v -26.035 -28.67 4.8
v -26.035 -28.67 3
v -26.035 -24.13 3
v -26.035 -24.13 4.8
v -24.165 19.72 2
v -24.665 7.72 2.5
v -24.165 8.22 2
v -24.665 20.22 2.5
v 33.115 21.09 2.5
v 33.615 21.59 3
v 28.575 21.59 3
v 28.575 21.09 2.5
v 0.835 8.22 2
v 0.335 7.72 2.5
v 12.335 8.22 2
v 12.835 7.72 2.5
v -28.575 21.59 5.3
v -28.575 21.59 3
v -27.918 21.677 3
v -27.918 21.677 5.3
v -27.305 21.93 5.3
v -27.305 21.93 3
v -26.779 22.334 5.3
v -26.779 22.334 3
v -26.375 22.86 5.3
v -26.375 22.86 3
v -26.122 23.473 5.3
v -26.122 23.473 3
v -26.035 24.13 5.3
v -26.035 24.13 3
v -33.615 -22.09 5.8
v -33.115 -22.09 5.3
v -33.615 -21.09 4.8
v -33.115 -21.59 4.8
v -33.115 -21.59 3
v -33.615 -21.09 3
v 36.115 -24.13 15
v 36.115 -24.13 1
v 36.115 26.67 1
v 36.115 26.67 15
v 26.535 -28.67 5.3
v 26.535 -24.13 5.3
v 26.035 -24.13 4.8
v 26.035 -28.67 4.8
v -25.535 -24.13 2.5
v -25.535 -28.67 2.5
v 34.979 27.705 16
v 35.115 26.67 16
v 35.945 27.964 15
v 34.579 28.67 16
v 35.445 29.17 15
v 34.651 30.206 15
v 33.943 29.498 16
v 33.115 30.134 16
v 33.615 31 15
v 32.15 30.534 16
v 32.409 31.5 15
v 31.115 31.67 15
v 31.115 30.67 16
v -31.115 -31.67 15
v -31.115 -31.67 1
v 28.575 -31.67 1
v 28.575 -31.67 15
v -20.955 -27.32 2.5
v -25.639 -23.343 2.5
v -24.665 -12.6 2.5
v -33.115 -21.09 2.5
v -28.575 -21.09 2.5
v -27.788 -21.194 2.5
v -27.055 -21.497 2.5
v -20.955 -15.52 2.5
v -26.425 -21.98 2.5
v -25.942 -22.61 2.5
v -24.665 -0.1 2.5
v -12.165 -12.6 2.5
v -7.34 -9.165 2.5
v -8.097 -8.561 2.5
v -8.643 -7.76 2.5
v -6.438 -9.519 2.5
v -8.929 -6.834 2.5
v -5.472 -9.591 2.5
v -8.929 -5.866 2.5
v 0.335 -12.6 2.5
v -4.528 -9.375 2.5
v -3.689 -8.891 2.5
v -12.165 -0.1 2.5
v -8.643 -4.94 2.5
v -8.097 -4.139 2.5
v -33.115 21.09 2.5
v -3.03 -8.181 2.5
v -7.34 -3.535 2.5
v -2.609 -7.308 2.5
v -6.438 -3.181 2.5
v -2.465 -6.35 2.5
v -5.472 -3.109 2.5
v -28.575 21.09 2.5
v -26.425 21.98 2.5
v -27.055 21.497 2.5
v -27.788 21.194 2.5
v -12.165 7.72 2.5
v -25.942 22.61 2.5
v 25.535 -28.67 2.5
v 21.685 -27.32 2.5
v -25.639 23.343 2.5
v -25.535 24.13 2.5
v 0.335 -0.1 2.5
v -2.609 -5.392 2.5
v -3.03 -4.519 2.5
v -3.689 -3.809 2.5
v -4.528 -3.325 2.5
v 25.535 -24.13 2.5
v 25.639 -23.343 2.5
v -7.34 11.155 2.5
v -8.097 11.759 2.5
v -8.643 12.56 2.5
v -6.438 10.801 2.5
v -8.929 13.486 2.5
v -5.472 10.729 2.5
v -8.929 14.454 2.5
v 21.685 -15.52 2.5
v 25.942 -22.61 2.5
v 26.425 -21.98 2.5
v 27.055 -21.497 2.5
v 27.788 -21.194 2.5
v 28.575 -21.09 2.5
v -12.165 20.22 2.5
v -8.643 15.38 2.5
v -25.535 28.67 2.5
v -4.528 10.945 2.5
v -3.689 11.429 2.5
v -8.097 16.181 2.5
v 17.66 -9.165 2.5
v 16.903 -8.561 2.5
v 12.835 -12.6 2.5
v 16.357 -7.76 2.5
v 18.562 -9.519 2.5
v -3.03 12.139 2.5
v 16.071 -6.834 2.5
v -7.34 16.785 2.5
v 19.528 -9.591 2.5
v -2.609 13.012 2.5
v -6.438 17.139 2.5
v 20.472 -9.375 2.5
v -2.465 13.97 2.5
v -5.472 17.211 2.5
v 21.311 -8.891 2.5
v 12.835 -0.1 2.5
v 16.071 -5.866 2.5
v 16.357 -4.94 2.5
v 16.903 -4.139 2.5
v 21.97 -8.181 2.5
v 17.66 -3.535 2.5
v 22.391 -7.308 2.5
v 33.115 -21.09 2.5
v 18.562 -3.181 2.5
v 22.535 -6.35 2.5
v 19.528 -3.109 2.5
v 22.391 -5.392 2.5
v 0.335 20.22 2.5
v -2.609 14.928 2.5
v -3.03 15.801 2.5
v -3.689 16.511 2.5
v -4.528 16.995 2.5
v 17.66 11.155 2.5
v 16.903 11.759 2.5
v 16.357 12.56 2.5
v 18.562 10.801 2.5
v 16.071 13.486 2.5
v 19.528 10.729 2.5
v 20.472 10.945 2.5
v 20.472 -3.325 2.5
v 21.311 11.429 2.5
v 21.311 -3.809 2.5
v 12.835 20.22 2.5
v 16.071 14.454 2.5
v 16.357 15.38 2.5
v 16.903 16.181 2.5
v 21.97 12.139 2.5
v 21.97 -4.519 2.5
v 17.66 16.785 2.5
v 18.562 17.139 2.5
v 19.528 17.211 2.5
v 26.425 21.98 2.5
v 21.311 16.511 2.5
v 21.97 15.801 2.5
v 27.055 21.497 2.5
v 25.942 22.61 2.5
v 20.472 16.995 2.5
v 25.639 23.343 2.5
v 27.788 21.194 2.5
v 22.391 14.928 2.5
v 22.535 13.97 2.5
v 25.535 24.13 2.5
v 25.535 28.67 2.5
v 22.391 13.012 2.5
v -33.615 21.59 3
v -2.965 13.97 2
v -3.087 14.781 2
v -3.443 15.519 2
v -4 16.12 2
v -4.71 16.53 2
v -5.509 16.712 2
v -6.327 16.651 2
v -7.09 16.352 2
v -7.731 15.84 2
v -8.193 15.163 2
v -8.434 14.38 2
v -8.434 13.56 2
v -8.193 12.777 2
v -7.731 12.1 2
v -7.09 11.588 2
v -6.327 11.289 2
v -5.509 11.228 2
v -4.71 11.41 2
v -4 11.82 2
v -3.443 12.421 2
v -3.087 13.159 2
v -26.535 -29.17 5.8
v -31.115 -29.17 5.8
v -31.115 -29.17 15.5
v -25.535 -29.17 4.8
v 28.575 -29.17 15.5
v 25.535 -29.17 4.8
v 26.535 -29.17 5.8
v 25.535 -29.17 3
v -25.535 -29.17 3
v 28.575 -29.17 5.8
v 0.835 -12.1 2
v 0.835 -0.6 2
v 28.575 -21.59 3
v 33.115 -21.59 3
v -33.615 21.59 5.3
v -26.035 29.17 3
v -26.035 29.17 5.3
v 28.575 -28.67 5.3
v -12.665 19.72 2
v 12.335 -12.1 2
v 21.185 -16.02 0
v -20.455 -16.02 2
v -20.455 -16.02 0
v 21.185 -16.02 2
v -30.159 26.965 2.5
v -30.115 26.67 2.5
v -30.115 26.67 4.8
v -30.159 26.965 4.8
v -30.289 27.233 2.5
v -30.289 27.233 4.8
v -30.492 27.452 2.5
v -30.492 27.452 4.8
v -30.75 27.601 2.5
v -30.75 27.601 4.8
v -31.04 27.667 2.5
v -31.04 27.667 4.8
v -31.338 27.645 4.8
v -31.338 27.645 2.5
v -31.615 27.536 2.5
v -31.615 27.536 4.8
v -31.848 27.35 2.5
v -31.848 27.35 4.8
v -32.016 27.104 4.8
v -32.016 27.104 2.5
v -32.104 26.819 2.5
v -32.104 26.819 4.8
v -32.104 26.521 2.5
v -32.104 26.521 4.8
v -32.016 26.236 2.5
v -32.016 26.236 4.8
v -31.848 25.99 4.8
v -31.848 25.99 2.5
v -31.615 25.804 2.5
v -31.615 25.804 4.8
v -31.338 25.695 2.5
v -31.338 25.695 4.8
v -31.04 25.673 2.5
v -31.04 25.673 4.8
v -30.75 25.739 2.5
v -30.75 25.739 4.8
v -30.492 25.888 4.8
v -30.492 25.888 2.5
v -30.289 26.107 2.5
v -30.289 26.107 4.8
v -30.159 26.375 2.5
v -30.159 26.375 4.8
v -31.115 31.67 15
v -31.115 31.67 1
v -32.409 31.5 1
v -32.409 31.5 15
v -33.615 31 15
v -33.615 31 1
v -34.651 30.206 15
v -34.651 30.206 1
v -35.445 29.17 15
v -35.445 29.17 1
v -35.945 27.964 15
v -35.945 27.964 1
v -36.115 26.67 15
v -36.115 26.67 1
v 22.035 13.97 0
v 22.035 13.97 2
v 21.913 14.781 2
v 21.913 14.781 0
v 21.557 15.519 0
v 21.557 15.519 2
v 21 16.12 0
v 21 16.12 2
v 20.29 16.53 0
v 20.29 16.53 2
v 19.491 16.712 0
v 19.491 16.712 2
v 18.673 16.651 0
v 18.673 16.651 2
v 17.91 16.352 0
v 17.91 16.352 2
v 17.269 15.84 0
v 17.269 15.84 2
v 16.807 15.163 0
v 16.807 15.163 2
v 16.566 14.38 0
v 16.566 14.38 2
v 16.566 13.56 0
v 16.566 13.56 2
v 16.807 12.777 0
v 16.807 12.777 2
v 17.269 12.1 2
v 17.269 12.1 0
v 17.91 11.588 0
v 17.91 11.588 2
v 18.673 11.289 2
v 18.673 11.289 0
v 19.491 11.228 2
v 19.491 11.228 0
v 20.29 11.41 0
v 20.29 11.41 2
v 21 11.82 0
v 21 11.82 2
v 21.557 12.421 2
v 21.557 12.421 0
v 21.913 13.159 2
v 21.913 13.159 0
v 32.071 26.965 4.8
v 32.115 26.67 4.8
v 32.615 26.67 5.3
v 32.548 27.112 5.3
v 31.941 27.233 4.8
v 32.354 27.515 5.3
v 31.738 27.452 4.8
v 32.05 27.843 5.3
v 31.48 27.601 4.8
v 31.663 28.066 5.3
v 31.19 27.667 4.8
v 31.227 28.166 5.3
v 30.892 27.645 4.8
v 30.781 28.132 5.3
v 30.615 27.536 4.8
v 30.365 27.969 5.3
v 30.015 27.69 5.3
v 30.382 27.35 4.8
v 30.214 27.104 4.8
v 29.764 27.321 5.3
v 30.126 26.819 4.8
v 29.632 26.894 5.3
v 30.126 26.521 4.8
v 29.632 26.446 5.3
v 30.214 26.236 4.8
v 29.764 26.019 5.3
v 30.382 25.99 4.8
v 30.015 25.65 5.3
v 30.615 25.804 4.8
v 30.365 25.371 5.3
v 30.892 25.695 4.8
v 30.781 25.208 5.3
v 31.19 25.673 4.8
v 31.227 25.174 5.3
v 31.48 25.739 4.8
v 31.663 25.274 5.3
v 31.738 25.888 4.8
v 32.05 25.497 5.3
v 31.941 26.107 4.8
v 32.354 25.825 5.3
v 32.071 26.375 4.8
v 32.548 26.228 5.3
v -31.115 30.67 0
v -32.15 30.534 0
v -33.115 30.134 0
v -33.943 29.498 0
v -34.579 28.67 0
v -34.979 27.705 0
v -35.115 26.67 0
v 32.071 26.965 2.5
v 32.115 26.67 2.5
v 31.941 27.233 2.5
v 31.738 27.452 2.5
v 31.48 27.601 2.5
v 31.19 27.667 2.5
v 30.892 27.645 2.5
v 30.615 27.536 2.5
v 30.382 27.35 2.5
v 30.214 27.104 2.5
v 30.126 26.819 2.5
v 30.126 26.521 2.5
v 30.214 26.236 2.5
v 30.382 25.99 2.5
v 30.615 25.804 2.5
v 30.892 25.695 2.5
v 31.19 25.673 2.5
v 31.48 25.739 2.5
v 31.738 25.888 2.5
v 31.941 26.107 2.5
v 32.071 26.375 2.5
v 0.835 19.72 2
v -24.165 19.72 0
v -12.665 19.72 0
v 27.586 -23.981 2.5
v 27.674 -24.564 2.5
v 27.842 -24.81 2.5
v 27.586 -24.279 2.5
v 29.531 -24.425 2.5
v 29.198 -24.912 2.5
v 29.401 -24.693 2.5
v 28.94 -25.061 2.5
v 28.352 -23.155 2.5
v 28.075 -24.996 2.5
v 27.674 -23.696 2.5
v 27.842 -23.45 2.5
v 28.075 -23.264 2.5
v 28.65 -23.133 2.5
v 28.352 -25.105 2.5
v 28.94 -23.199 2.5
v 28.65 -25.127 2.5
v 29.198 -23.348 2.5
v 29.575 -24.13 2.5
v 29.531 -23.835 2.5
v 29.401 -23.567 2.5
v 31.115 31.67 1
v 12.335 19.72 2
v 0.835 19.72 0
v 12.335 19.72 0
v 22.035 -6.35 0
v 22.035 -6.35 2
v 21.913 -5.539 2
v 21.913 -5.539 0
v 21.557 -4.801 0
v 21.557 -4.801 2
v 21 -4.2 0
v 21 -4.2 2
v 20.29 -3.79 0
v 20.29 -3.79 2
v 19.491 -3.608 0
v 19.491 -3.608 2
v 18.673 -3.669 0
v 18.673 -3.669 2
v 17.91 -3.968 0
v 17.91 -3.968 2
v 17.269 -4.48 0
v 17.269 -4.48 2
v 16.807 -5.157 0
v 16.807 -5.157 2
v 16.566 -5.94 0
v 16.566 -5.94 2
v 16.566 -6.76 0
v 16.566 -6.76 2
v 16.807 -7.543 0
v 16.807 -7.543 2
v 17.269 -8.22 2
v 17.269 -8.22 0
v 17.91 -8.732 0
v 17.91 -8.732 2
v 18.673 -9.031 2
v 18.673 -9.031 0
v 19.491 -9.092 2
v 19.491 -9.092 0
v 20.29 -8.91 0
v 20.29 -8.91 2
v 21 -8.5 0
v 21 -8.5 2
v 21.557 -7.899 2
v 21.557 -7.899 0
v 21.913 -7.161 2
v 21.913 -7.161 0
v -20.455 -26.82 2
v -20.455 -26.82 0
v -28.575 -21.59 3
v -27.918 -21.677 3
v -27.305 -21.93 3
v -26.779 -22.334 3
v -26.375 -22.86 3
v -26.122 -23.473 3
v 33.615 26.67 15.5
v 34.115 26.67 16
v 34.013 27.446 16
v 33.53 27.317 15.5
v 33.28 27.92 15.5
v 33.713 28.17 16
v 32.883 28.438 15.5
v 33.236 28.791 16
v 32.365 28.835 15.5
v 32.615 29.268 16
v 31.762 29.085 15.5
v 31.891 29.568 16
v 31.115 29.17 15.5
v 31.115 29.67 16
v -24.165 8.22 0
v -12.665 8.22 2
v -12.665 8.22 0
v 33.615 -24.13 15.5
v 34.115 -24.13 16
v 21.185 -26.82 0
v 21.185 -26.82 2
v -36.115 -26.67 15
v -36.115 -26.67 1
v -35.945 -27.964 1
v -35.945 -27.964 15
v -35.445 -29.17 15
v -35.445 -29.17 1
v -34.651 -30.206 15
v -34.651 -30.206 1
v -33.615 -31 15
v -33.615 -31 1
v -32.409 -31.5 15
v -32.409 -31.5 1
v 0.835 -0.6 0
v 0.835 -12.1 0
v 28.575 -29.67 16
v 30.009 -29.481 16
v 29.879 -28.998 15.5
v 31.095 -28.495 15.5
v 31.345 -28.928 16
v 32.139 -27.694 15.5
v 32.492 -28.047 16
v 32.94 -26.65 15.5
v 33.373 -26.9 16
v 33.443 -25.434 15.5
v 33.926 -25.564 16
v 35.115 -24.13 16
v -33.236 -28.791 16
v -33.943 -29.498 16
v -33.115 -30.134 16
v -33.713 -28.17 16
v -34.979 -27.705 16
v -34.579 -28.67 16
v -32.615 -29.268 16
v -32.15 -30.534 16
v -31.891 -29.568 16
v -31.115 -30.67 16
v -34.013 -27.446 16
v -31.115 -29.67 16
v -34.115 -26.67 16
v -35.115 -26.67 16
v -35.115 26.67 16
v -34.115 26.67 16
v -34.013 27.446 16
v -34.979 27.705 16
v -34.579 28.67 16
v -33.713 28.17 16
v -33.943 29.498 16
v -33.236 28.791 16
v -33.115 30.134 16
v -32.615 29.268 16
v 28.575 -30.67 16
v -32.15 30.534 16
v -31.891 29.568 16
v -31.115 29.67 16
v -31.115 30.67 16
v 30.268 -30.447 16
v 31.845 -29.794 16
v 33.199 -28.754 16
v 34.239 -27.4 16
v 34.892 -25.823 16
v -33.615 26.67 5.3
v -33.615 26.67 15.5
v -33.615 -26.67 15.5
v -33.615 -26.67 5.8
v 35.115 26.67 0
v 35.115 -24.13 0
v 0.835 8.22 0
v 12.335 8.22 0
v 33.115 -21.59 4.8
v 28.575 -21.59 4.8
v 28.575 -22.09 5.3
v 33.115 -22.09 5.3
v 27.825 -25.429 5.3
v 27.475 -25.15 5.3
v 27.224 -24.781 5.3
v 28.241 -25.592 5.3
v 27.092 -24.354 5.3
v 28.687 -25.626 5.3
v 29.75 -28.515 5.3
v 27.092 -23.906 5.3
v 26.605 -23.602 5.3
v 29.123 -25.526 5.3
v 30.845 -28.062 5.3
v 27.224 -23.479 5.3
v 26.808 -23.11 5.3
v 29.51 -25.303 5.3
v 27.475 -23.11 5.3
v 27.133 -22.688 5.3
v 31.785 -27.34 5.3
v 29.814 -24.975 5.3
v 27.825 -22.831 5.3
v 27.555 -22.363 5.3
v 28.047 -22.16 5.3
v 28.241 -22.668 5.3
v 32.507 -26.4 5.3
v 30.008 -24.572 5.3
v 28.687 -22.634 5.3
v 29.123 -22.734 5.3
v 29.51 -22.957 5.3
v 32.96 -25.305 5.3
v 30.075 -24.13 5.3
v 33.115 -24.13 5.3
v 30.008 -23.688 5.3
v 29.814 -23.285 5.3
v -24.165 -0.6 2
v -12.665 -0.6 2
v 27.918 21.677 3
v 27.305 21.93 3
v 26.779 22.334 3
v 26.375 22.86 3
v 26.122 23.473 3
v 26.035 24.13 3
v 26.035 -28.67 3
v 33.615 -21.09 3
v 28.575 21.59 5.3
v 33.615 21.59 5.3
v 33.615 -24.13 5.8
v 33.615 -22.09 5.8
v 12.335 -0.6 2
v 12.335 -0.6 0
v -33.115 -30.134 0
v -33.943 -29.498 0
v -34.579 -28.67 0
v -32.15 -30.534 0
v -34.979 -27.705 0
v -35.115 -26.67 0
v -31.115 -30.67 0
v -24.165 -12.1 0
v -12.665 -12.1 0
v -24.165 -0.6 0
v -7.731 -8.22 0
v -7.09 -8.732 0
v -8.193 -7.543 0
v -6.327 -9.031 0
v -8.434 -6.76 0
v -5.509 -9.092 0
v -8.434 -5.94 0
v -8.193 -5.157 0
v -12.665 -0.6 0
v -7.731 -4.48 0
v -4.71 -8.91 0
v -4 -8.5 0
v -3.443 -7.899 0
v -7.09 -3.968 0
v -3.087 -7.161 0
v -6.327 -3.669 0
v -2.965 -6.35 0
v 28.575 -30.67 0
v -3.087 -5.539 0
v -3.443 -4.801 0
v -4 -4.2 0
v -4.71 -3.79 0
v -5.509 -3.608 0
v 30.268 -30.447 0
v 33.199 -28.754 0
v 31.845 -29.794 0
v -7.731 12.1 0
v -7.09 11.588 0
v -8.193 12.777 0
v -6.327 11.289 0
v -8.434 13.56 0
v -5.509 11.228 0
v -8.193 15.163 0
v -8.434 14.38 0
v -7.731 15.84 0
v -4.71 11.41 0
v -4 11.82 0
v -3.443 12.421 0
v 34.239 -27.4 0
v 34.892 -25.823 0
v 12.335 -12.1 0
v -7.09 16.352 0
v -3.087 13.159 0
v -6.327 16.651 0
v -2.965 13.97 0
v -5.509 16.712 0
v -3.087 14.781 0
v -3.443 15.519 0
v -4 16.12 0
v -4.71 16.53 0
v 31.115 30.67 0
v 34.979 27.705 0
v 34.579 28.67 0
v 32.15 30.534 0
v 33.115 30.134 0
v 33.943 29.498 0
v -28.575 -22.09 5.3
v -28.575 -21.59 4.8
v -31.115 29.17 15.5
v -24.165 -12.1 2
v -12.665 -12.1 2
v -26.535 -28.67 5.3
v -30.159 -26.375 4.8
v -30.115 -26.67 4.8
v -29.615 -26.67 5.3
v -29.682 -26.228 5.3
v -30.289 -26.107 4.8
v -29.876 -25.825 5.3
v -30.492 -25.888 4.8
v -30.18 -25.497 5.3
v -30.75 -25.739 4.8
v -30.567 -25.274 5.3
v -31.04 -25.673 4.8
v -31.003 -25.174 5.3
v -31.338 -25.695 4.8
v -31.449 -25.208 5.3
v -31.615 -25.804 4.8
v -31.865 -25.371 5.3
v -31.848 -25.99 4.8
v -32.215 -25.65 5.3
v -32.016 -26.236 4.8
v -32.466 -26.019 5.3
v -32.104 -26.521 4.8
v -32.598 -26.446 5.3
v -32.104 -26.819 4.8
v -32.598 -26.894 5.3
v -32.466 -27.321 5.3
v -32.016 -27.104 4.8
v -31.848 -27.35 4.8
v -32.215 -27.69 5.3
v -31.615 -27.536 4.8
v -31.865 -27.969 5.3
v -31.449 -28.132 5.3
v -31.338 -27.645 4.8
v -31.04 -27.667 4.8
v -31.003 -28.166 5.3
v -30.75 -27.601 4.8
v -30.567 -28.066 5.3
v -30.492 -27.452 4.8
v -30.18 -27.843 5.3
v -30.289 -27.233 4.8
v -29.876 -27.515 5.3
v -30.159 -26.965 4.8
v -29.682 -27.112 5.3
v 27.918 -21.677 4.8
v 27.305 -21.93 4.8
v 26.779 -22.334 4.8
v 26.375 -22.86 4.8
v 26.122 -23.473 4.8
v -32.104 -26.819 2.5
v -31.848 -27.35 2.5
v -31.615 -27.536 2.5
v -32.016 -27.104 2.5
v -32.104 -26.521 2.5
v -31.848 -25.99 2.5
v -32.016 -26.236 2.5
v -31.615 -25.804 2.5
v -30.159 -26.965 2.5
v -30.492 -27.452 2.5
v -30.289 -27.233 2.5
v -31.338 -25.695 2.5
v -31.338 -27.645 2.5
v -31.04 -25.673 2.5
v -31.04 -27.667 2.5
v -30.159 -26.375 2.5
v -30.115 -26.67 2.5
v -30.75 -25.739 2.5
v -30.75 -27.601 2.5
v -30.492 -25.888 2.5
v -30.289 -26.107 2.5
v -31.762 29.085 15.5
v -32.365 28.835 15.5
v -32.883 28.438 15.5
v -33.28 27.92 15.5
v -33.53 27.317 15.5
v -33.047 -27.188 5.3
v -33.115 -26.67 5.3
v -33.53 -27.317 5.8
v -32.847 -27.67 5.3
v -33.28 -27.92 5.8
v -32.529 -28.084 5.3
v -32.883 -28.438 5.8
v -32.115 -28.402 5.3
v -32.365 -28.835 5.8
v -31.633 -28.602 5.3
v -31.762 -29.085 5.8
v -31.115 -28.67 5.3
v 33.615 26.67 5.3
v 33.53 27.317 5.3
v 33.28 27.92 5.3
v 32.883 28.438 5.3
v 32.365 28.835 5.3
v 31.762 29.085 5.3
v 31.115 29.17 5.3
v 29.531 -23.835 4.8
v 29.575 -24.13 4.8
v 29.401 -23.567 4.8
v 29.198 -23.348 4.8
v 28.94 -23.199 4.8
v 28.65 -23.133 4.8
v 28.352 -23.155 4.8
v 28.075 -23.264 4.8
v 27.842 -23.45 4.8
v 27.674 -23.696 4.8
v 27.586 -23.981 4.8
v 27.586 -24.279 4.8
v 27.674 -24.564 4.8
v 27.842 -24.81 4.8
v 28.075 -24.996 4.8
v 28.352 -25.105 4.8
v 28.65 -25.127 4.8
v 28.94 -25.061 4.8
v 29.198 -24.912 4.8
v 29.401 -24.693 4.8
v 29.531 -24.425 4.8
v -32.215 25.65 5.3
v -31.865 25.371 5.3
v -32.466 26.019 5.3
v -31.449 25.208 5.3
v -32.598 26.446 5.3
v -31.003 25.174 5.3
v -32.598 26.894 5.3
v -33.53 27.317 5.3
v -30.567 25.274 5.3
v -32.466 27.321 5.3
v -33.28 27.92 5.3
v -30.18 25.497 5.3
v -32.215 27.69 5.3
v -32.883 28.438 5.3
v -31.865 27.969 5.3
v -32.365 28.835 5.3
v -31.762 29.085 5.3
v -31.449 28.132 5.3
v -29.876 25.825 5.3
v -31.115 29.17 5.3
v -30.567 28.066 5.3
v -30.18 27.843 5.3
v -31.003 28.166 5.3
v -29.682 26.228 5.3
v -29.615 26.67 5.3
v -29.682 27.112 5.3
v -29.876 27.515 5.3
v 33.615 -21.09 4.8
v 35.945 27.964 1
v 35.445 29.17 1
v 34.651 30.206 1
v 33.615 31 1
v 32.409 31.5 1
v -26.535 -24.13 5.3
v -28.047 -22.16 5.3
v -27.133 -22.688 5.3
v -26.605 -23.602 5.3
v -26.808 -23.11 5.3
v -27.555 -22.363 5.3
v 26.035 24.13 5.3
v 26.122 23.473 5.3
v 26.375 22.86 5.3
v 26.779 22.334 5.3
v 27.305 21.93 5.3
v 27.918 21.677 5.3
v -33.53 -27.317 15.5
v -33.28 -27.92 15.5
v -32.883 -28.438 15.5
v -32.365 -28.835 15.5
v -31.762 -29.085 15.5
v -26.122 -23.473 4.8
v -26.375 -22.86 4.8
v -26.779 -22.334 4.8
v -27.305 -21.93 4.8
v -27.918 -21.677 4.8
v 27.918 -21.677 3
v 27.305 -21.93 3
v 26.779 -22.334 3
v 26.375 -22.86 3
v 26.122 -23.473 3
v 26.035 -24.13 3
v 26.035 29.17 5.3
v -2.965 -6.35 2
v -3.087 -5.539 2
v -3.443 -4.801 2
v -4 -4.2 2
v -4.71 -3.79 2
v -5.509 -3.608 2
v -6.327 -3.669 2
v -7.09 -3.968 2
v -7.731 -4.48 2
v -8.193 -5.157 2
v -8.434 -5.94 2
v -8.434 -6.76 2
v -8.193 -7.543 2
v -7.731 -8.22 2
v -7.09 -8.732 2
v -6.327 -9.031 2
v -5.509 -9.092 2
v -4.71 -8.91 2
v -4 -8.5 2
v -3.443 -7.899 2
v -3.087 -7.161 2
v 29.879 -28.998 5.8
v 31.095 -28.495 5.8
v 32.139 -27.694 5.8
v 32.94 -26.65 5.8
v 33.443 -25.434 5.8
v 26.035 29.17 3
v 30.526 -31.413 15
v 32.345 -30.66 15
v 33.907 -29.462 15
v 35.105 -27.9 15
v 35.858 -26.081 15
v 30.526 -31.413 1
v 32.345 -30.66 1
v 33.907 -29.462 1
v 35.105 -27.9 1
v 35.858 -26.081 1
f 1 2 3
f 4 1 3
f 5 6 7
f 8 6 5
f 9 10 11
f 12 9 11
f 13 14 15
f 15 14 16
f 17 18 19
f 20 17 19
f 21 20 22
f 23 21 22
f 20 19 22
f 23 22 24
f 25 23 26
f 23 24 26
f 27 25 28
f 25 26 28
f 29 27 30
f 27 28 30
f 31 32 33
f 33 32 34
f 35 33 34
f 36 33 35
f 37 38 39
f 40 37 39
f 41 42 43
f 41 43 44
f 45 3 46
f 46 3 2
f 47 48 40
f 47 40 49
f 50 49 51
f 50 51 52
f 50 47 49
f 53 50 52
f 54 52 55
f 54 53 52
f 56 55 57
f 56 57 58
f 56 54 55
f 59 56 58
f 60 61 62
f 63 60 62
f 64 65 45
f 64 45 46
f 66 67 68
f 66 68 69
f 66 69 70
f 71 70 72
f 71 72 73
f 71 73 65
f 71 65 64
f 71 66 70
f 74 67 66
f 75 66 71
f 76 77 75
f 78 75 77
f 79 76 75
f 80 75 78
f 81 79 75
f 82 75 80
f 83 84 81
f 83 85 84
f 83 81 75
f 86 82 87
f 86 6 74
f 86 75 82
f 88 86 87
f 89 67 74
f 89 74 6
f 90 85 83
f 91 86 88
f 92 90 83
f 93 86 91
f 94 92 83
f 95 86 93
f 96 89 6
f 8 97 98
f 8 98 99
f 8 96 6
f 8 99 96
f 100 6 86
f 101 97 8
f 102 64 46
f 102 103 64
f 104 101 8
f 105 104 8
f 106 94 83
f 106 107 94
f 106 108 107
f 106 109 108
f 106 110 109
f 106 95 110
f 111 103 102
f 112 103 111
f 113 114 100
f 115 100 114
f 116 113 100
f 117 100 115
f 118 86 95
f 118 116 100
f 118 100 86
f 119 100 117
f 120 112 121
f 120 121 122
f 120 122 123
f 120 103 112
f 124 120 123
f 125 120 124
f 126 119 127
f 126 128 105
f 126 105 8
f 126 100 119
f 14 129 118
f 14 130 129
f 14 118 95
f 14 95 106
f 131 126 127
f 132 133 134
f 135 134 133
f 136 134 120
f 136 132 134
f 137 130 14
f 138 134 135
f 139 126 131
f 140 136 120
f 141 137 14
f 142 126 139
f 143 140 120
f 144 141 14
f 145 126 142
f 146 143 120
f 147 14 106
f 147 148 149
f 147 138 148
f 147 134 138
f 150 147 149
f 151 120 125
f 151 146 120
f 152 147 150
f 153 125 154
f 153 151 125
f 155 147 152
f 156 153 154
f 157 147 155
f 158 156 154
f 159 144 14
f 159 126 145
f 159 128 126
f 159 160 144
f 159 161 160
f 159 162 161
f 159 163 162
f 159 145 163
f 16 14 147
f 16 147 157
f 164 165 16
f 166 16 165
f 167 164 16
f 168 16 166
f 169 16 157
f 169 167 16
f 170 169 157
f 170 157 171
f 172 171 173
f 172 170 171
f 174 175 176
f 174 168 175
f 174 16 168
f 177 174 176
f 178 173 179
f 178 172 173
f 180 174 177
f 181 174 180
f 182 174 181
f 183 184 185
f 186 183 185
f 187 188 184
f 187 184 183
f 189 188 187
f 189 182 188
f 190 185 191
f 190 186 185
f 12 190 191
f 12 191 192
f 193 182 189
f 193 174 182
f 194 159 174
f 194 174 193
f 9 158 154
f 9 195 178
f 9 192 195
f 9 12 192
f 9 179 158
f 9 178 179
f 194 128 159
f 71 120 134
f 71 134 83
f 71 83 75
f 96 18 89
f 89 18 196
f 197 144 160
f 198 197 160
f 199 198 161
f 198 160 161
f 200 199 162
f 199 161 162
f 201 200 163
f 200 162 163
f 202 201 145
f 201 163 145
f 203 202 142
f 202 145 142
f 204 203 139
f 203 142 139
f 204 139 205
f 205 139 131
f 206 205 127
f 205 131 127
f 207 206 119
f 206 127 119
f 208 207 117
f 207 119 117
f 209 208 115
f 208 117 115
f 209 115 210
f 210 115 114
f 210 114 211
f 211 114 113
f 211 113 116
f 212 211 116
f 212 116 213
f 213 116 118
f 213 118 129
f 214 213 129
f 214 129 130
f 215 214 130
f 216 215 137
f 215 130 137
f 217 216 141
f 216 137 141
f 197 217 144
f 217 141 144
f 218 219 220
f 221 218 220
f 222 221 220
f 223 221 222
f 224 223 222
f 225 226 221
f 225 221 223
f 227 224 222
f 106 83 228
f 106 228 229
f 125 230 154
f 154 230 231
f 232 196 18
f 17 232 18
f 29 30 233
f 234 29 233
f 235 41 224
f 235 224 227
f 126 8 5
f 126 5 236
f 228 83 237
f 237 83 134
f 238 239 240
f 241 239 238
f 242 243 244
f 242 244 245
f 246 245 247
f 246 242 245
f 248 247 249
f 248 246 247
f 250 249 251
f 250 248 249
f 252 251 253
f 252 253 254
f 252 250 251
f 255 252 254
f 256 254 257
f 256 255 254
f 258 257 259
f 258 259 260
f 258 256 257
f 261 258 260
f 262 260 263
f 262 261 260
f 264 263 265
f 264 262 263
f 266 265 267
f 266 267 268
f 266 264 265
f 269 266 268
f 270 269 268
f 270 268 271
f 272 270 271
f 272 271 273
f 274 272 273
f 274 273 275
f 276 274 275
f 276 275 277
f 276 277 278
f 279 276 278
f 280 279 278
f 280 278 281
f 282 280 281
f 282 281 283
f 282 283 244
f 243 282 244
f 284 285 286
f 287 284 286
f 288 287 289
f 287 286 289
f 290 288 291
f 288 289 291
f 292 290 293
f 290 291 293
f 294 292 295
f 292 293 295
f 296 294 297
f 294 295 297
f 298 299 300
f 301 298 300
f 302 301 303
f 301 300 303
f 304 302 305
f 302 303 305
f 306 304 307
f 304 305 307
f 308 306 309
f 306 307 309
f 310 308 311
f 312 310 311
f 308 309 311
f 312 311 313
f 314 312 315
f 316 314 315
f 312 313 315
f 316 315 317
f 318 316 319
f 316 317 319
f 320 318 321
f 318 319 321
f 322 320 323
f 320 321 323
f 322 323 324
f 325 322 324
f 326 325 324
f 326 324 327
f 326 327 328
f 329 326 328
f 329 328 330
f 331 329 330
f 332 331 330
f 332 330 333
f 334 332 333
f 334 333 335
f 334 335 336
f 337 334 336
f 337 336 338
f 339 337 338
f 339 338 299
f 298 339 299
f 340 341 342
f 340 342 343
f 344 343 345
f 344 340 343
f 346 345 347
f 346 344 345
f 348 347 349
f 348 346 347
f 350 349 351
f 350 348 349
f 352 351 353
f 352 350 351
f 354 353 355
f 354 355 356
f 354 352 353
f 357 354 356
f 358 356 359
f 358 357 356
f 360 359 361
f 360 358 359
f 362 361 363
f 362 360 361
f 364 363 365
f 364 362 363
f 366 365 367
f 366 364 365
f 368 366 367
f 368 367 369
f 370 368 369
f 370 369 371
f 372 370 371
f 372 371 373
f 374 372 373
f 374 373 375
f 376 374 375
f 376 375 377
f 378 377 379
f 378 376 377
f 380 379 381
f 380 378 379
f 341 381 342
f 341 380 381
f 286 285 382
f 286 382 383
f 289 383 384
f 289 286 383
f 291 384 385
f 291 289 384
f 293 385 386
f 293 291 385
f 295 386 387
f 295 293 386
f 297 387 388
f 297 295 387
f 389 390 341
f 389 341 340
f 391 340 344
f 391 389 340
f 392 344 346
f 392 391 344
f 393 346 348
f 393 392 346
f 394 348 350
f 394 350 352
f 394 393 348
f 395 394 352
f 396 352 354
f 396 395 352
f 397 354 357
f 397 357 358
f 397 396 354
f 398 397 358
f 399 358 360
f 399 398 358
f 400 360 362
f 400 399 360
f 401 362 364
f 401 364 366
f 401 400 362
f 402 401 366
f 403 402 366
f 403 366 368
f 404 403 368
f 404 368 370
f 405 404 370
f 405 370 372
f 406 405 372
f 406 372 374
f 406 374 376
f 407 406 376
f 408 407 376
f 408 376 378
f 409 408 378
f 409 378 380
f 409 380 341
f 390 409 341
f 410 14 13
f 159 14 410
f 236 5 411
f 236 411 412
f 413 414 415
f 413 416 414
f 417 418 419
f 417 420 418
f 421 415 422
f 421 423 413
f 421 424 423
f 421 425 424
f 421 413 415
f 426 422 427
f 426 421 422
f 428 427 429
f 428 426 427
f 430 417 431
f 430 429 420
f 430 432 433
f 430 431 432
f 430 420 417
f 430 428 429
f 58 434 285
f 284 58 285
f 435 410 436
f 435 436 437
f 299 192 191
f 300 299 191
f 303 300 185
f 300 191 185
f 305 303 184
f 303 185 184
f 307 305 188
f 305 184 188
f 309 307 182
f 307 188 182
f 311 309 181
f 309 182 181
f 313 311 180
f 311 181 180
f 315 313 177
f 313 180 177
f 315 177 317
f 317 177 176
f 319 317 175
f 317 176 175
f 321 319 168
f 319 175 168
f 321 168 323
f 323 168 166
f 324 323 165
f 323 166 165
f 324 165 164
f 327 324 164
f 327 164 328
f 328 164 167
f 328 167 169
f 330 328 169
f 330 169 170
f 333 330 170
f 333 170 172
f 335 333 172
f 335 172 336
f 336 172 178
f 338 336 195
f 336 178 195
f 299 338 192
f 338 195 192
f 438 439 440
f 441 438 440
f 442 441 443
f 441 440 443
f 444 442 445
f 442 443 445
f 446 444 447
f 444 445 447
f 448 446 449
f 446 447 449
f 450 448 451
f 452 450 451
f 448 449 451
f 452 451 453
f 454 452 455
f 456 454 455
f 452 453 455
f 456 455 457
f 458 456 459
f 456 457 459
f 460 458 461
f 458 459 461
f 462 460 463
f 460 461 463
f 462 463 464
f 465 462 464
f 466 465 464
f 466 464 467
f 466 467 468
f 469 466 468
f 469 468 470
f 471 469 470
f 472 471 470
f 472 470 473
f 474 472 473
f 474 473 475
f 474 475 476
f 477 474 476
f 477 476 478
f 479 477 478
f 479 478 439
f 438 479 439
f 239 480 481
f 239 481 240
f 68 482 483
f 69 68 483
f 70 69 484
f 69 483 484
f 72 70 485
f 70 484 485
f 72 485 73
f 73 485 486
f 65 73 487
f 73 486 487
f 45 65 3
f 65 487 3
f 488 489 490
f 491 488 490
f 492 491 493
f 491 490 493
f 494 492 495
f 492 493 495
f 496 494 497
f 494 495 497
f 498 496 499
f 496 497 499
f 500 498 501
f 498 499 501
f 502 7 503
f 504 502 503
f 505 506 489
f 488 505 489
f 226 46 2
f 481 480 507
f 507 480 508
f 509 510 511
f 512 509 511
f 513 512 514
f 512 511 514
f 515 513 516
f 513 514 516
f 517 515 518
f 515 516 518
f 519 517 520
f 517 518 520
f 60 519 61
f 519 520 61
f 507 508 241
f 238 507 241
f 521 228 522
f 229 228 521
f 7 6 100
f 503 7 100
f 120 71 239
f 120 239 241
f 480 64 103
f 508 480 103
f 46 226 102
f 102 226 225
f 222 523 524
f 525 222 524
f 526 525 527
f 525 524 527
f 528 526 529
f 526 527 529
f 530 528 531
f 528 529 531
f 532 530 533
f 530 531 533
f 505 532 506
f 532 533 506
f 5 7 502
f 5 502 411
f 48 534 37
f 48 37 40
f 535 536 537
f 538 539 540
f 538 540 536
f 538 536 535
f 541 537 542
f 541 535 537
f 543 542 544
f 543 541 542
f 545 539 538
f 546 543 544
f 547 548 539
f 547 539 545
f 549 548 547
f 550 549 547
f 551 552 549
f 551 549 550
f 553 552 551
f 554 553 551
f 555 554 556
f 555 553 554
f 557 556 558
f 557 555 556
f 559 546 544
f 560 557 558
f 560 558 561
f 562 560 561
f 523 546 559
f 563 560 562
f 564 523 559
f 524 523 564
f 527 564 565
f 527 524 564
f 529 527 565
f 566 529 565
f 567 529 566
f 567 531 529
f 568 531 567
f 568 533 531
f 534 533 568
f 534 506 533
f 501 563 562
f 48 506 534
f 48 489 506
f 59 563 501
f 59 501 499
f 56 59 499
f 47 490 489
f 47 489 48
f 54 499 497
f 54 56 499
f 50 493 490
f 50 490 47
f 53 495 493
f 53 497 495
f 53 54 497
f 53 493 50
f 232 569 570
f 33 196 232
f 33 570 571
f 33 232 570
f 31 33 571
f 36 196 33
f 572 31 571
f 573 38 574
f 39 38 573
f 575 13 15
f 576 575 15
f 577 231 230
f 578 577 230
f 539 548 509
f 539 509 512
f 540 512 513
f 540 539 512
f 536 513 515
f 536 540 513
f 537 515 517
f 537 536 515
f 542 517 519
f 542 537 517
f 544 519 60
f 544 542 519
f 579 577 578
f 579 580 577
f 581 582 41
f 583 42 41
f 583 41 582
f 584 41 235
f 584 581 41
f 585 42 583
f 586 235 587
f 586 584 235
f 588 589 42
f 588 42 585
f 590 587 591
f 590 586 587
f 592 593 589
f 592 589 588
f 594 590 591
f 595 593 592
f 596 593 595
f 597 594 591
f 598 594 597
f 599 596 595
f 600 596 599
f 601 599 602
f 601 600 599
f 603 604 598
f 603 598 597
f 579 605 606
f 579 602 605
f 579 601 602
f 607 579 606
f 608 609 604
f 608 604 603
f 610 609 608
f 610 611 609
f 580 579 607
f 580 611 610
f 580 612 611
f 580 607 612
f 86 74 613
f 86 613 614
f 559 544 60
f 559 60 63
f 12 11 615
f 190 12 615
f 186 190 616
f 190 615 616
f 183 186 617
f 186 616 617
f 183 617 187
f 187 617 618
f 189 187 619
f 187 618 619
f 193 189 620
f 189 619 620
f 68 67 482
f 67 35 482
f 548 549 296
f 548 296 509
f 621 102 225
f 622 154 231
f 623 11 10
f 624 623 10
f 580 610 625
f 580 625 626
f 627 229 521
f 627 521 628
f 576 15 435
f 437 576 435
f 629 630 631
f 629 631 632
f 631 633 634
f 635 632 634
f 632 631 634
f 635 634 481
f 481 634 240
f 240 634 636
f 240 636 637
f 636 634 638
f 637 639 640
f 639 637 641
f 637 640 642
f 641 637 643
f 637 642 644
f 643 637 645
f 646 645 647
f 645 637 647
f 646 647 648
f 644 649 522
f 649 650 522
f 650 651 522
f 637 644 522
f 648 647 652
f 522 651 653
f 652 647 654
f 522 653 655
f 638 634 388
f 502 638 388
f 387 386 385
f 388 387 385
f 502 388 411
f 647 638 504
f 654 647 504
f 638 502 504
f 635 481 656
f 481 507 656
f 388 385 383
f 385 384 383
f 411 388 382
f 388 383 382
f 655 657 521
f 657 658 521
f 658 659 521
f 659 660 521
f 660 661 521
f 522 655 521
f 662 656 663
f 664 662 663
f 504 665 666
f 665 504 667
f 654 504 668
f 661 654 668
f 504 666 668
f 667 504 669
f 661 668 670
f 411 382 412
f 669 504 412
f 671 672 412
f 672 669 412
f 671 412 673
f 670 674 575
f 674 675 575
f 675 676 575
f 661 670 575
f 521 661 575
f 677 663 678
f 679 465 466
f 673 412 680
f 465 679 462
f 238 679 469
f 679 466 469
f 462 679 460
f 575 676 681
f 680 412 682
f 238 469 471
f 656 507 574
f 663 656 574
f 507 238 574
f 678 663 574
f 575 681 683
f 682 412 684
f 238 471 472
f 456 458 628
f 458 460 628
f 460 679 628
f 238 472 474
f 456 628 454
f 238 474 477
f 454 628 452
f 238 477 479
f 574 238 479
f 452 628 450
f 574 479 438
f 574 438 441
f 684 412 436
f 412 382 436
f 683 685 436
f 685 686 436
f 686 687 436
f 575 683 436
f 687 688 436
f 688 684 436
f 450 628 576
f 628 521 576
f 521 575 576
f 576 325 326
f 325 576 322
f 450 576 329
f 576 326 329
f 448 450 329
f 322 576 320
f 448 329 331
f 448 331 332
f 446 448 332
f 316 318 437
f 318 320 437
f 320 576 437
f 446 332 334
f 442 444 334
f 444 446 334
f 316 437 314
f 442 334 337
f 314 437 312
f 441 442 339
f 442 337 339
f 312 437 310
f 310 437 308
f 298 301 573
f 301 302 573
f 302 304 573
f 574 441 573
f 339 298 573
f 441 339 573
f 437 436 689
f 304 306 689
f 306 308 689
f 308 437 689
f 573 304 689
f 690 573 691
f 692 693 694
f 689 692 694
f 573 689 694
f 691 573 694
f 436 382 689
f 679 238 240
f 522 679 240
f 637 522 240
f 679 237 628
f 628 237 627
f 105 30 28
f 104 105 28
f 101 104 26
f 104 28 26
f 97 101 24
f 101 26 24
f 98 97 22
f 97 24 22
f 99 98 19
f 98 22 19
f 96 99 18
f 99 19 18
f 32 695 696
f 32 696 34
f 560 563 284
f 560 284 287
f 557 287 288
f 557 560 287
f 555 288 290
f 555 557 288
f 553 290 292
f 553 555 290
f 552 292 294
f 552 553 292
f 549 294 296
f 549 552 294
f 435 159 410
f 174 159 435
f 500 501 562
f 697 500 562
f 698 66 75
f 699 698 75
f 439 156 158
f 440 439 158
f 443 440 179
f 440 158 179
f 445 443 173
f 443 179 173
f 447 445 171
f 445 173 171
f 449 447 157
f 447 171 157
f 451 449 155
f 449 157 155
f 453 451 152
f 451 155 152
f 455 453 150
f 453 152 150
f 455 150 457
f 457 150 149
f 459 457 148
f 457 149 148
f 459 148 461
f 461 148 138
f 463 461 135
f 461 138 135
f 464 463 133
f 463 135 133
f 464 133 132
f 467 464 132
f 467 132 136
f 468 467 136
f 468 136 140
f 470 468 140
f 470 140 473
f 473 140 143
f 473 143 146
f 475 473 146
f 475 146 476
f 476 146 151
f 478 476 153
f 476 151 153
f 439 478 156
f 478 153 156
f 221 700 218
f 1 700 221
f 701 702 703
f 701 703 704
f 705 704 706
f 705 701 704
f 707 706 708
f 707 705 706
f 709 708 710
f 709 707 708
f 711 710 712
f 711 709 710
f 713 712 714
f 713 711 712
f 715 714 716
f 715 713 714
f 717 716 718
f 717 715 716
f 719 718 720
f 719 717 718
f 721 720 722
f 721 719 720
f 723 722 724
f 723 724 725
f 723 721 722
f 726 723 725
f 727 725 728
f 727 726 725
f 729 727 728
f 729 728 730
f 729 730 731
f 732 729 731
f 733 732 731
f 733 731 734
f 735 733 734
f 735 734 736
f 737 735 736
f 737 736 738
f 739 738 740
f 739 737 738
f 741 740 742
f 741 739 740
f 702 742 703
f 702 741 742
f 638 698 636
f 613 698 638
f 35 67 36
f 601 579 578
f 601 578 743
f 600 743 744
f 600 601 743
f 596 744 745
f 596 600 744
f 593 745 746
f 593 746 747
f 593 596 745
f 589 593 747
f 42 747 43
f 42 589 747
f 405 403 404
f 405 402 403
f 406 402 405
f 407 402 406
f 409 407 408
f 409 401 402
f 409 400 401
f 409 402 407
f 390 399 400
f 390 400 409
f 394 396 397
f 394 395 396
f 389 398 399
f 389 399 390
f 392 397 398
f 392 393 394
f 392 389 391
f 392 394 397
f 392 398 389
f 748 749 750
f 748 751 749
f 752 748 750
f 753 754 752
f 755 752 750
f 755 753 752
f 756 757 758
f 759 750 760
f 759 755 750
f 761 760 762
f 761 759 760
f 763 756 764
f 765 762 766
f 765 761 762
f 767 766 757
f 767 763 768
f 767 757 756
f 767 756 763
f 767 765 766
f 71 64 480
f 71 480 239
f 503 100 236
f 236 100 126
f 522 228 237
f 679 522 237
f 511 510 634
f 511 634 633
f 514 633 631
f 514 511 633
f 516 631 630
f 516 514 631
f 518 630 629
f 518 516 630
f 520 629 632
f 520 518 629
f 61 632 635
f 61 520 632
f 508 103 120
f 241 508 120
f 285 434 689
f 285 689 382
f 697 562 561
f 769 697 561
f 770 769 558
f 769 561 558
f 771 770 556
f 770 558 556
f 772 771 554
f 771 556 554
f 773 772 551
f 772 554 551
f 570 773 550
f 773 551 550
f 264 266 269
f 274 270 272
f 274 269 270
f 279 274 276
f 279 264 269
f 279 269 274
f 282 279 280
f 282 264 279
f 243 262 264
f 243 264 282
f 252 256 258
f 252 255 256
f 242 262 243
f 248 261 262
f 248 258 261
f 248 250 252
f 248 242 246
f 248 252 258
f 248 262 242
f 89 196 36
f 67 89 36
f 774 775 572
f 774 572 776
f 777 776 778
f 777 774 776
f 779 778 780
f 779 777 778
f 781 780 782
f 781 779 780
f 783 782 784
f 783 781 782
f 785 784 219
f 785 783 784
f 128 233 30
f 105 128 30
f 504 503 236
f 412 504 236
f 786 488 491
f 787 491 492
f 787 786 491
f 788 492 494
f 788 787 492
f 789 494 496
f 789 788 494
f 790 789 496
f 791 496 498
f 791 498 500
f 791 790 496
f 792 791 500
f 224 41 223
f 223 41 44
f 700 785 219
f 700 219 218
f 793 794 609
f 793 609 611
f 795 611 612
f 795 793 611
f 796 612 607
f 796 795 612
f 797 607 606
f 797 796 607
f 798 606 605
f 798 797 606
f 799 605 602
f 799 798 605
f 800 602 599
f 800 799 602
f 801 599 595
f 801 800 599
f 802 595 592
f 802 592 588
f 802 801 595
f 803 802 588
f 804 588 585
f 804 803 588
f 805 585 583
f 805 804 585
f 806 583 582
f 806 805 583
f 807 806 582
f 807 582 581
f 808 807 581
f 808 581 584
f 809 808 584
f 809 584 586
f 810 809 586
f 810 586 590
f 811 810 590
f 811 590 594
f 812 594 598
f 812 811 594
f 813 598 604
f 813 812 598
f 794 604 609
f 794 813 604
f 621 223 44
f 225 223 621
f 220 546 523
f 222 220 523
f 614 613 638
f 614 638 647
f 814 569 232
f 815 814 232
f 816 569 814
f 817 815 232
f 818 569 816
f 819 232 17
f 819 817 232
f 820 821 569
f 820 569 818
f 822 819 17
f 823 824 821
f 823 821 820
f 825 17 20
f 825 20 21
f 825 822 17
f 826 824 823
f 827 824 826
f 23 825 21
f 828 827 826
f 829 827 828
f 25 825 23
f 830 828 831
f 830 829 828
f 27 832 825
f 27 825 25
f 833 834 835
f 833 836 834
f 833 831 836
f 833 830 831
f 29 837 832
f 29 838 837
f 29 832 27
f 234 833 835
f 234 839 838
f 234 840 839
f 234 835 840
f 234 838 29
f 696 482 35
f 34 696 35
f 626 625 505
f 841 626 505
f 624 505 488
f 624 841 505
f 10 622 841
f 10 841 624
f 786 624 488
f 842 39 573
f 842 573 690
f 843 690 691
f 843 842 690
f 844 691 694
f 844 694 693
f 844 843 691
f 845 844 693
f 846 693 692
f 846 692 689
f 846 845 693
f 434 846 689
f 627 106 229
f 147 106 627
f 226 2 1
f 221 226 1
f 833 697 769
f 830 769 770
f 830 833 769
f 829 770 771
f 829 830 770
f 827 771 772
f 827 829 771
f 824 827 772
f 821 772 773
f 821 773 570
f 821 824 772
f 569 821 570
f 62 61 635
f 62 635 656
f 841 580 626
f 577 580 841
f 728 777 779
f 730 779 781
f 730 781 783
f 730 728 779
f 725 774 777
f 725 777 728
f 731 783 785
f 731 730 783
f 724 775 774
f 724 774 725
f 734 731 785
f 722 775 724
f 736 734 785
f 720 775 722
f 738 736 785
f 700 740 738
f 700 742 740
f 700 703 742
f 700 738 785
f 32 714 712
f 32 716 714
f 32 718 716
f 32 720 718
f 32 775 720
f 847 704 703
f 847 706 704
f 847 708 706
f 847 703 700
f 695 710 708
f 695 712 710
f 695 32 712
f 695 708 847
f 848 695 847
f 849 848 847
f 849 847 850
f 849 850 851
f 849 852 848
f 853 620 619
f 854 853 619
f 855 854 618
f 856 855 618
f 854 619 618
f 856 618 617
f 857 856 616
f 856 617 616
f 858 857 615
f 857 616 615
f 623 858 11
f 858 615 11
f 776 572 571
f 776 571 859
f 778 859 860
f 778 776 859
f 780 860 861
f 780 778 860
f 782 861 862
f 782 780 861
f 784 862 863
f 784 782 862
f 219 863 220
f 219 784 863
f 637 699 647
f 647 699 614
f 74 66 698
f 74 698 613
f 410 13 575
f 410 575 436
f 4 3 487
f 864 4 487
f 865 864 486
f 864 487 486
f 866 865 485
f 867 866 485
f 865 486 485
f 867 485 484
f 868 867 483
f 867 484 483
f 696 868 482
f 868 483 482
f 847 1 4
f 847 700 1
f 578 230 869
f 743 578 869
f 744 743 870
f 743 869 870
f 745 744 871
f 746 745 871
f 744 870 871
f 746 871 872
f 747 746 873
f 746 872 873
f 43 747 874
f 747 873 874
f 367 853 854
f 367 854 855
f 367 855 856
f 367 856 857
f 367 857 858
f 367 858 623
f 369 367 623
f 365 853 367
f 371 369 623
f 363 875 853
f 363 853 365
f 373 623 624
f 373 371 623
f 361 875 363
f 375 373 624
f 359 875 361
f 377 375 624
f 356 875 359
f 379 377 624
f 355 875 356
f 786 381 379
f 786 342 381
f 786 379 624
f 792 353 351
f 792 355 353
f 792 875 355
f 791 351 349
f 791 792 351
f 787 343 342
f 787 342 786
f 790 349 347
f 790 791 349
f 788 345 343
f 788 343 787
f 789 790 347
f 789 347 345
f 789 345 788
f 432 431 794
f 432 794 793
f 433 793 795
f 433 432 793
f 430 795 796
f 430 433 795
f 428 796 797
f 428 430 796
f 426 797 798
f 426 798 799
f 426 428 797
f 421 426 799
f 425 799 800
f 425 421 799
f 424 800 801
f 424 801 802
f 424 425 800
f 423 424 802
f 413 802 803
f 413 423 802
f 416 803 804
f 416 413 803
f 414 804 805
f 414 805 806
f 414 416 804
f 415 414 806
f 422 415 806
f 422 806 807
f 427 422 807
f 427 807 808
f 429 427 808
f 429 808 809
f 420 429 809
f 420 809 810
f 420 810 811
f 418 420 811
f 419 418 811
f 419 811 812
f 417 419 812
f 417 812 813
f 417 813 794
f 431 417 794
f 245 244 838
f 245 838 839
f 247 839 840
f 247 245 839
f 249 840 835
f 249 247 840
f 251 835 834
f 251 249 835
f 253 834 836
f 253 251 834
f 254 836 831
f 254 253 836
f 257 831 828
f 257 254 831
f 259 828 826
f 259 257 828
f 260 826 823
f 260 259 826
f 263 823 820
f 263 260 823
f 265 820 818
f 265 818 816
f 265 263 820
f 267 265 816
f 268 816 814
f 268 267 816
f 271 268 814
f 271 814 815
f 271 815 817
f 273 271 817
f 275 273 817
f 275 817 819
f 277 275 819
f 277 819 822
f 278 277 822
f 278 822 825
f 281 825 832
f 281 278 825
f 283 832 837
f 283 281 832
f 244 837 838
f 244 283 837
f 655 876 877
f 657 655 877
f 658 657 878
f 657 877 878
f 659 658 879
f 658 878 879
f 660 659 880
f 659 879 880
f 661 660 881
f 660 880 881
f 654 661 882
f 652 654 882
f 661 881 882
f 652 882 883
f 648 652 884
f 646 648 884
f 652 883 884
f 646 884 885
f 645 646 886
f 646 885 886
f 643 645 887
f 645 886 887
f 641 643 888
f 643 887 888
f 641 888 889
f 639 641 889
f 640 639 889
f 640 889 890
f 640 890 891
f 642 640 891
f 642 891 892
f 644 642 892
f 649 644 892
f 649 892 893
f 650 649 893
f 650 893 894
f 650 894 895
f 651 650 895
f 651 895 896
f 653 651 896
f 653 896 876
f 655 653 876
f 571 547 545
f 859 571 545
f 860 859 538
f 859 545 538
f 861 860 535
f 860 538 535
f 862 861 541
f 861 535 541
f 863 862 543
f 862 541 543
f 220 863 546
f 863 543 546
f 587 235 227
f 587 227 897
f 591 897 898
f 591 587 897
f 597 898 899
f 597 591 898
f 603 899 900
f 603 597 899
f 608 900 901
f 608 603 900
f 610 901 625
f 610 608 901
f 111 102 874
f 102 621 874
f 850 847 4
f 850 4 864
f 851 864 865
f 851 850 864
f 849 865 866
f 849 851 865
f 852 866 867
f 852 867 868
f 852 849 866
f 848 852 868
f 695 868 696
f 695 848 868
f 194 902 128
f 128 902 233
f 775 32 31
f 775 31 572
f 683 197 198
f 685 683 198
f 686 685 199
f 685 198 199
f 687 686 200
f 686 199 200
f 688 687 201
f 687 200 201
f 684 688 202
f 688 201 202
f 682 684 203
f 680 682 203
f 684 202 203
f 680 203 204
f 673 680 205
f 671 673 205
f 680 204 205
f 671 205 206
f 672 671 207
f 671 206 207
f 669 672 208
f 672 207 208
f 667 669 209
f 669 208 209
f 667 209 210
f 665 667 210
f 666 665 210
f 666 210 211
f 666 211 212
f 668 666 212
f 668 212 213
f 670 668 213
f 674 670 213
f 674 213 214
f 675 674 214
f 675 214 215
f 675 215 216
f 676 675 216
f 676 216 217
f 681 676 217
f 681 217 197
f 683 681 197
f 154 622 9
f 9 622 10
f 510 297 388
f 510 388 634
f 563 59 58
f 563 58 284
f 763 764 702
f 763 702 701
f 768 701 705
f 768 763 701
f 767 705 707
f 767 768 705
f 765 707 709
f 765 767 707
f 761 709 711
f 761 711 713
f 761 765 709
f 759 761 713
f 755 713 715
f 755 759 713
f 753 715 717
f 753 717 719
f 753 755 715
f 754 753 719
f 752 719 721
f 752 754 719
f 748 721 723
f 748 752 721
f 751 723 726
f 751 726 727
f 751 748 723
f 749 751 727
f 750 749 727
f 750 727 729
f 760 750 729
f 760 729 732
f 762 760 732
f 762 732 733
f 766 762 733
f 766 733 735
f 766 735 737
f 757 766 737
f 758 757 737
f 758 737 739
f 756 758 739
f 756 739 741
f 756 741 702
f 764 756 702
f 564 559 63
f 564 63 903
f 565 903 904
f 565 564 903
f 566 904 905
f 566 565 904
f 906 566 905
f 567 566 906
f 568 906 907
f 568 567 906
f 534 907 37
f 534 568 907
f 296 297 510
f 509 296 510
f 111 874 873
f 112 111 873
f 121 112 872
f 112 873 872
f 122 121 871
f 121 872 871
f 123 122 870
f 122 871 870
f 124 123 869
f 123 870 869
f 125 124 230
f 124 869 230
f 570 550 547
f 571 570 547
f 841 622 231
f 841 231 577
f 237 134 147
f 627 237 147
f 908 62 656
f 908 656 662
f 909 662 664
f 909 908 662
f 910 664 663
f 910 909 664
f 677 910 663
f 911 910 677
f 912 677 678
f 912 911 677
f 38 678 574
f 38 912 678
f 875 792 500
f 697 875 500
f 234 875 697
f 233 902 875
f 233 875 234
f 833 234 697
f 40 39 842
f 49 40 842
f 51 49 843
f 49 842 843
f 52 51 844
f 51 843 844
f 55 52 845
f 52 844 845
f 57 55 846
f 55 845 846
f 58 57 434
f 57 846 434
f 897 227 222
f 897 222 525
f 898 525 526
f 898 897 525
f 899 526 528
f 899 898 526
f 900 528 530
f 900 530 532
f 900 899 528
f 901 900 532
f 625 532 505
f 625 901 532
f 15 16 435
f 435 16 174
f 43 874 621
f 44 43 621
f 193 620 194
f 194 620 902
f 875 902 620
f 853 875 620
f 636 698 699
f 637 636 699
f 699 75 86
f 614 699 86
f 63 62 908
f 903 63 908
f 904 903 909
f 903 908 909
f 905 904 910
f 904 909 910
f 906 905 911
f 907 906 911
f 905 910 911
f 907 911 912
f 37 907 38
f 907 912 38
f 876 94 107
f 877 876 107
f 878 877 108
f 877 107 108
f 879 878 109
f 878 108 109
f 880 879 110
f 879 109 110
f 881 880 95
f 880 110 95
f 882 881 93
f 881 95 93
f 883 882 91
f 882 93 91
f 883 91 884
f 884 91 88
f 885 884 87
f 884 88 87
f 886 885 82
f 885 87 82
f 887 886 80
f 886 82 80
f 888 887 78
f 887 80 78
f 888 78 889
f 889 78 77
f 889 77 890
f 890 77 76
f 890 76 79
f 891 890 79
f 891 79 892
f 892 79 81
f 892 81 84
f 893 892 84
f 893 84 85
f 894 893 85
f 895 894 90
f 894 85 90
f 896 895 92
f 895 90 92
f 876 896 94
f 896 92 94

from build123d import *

# Parameters (mm, degrees)
F0_R     = 1
F1_DEPTH = 16
F2_T     = -2.5
F3_DEPTH = 5.3
F4_W     = 11.5
F4_H     = 11.5
F4_R     = 2.75
F4_W_2   = 41.64
F4_H_2   = 10.8
F5_DEPTH = 2.501
F6_SIZE  = 1
F7_SIZE  = 0.5


with BuildPart() as f1:
    # F0 (on Top) → F1 (new body)
    with BuildSketch(Plane.XY):
        with BuildLine():
            Line((26.035, -31.67), (28.575, -31.67))
            ThreePointArc((28.575, -31.67), (33.9065851301, -29.4615851301), (36.115, -24.13))
            Line((36.115, -24.13), (36.115, -21.59))
            Line((36.115, -21.59), (28.575, -21.59))
            ThreePointArc((28.575, -21.59), (26.7789487758, -22.3339487758), (26.035, -24.13))
            Line((26.035, -24.13), (26.035, -31.67))
        make_face()
        with Locations((28.575, -24.13)):
            Circle(F0_R, mode=Mode.SUBTRACT)
        with BuildLine():
            Line((-26.035, -31.67), (26.035, -31.67))
            Line((26.035, -31.67), (26.035, -24.13))
            ThreePointArc((26.035, -24.13), (26.7789487758, -22.3339487758), (28.575, -21.59))
            Line((28.575, -21.59), (36.115, -21.59))
            Line((36.115, -21.59), (36.115, 21.59))
            Line((36.115, 21.59), (28.575, 21.59))
            ThreePointArc((28.575, 21.59), (26.7789487758, 22.3339487758), (26.035, 24.13))
            Line((26.035, 24.13), (26.035, 31.67))
            Line((26.035, 31.67), (-26.035, 31.67))
            Line((-26.035, 31.67), (-26.035, 24.13))
            ThreePointArc((-26.035, 24.13), (-26.7789487758, 22.3339487758), (-28.575, 21.59))
            Line((-28.575, 21.59), (-36.115, 21.59))
            Line((-36.115, 21.59), (-36.115, -21.59))
            Line((-36.115, -21.59), (-28.575, -21.59))
            ThreePointArc((-28.575, -21.59), (-26.7789487758, -22.3339487758), (-26.035, -24.13))
            Line((-26.035, -24.13), (-26.035, -31.67))
        make_face()
        with BuildLine():
            Line((-31.115, -31.67), (-26.035, -31.67))
            Line((-26.035, -31.67), (-26.035, -24.13))
            ThreePointArc((-26.035, -24.13), (-26.7789487758, -22.3339487758), (-28.575, -21.59))
            Line((-28.575, -21.59), (-36.115, -21.59))
            Line((-36.115, -21.59), (-36.115, -26.67))
            ThreePointArc((-36.115, -26.67), (-34.6505339059, -30.2055339059), (-31.115, -31.67))
        make_face()
        with Locations((-31.115, -26.67)):
            Circle(F0_R, mode=Mode.SUBTRACT)
        with BuildLine():
            Line((-36.115, 26.67), (-36.115, 21.59))
            Line((-36.115, 21.59), (-28.575, 21.59))
            ThreePointArc((-28.575, 21.59), (-26.7789487758, 22.3339487758), (-26.035, 24.13))
            Line((-26.035, 24.13), (-26.035, 31.67))
            Line((-26.035, 31.67), (-31.115, 31.67))
            ThreePointArc((-31.115, 31.67), (-34.6505339059, 30.2055339059), (-36.115, 26.67))
        make_face()
        with Locations((-31.115, 26.67)):
            Circle(F0_R, mode=Mode.SUBTRACT)
        with BuildLine():
            Line((28.575, 21.59), (36.115, 21.59))
            Line((36.115, 21.59), (36.115, 26.67))
            ThreePointArc((36.115, 26.67), (34.6505339059, 30.2055339059), (31.115, 31.67))
            Line((31.115, 31.67), (26.035, 31.67))
            Line((26.035, 31.67), (26.035, 24.13))
            ThreePointArc((26.035, 24.13), (26.7789487758, 22.3339487758), (28.575, 21.59))
        make_face()
        with Locations((31.115, 26.67)):
            Circle(F0_R, mode=Mode.SUBTRACT)
        with Locations((31.115, 26.67)):
            Circle(F0_R)
        with Locations((-31.115, 26.67)):
            Circle(F0_R)
        with Locations((-31.115, -26.67)):
            Circle(F0_R)
        with Locations((28.575, -24.13)):
            Circle(F0_R)
    extrude(amount=F1_DEPTH)

    # F2
    f2_openings = [f1.faces().sort_by_distance(p)[0] for p in [
        (-0.051092, 0.04441, 16),
    ]]
    offset(amount=F2_T, openings=f2_openings)

    # F0 (on Top) → F3 (join)
    with BuildSketch(Plane.XY):
        with BuildLine():
            Line((-31.115, -31.67), (-26.035, -31.67))
            Line((-26.035, -31.67), (-26.035, -24.13))
            ThreePointArc((-26.035, -24.13), (-26.7789487758, -22.3339487758), (-28.575, -21.59))
            Line((-28.575, -21.59), (-36.115, -21.59))
            Line((-36.115, -21.59), (-36.115, -26.67))
            ThreePointArc((-36.115, -26.67), (-34.6505339059, -30.2055339059), (-31.115, -31.67))
        make_face()
        with Locations((-31.115, -26.67)):
            Circle(F0_R, mode=Mode.SUBTRACT)
        with BuildLine():
            Line((26.035, -31.67), (28.575, -31.67))
            ThreePointArc((28.575, -31.67), (33.9065851301, -29.4615851301), (36.115, -24.13))
            Line((36.115, -24.13), (36.115, -21.59))
            Line((36.115, -21.59), (28.575, -21.59))
            ThreePointArc((28.575, -21.59), (26.7789487758, -22.3339487758), (26.035, -24.13))
            Line((26.035, -24.13), (26.035, -31.67))
        make_face()
        with Locations((28.575, -24.13)):
            Circle(F0_R, mode=Mode.SUBTRACT)
        with BuildLine():
            Line((28.575, 21.59), (36.115, 21.59))
            Line((36.115, 21.59), (36.115, 26.67))
            ThreePointArc((36.115, 26.67), (34.6505339059, 30.2055339059), (31.115, 31.67))
            Line((31.115, 31.67), (26.035, 31.67))
            Line((26.035, 31.67), (26.035, 24.13))
            ThreePointArc((26.035, 24.13), (26.7789487758, 22.3339487758), (28.575, 21.59))
        make_face()
        with Locations((31.115, 26.67)):
            Circle(F0_R, mode=Mode.SUBTRACT)
        with BuildLine():
            Line((-36.115, 26.67), (-36.115, 21.59))
            Line((-36.115, 21.59), (-28.575, 21.59))
            ThreePointArc((-28.575, 21.59), (-26.7789487758, 22.3339487758), (-26.035, 24.13))
            Line((-26.035, 24.13), (-26.035, 31.67))
            Line((-26.035, 31.67), (-31.115, 31.67))
            ThreePointArc((-31.115, 31.67), (-34.6505339059, 30.2055339059), (-36.115, 26.67))
        make_face()
        with Locations((-31.115, 26.67)):
            Circle(F0_R, mode=Mode.SUBTRACT)
    extrude(amount=F3_DEPTH)

    # F4 (on face) → F5 (cut, through all)
    with BuildSketch(Plane.XY.offset(2.5)):
        with Locations((-18.415, 13.97)):
            Rectangle(F4_W, F4_H)
        with Locations((-18.415, -6.35)):
            Rectangle(F4_W, F4_H)
        with Locations((-5.715, 13.97)):
            Circle(F4_R)
        with Locations((-5.715, -6.35)):
            Circle(F4_R)
        with Locations((6.585, -6.35)):
            Rectangle(F4_W, F4_H)
        with Locations((6.585, 13.97)):
            Rectangle(F4_W, F4_H)
        with Locations((19.285, 13.97)):
            Circle(F4_R)
        with Locations((19.285, -6.35)):
            Circle(F4_R)
        with Locations((0.365, -21.42)):
            Rectangle(F4_W_2, F4_H_2)
    extrude(amount=-F5_DEPTH, mode=Mode.SUBTRACT)

    # F6
    f6_edges = [f1.edges().sort_by_distance(p)[0] for p in [
        (-36.115, 0, 16),
        (-34.650534, 30.205534, 16),
        (0, 31.67, 16),
        (34.650534, 30.205534, 16),
        (36.115, 1.27, 16),
        (33.906585, -29.461585, 16),
        (-1.27, -31.67, 16),
        (-34.650534, -30.205534, 0),
        (-34.650534, -30.205534, 16),
        (33.906585, -29.461585, 0),
        (-1.27, -31.67, 0),
        (36.115, 1.27, 0),
        (-36.115, 0, 0),
        (34.650534, 30.205534, 0),
        (-34.650534, 30.205534, 0),
        (0, 31.67, 0),
    ]]
    chamfer(f6_edges, length=F6_SIZE)

    # F7
    f7_edges = [f1.edges().sort_by_distance(p)[0] for p in [
        (-31.095, -21.59, 5.3),
        (-26.778949, -22.333949, 5.3),
        (-26.035, -26.65, 5.3),
        (-28.575, -29.17, 5.3),
        (-32.882767, -28.437767, 5.3),
        (-33.615, -24.13, 5.3),
        (-32.115, -26.67, 5.3),
        (31.095, -21.59, 2.5),
        (26.778949, -22.333949, 2.5),
        (33.615, 0, 2.5),
        (26.035, -26.65, 2.5),
        (31.095, 21.59, 2.5),
        (0, -29.17, 2.5),
        (26.778949, 22.333949, 2.5),
        (-26.035, -26.65, 2.5),
        (26.035, 26.65, 2.5),
        (-26.778949, -22.333949, 2.5),
        (0, 29.17, 2.5),
        (-31.095, -21.59, 2.5),
        (-26.035, 26.65, 2.5),
        (-33.615, 0, 2.5),
        (-26.778949, 22.333949, 2.5),
        (-31.095, 21.59, 2.5),
        (-24.165, -6.35, 2.5),
        (-18.415, -12.1, 2.5),
        (-12.665, -6.35, 2.5),
        (-18.415, -0.6, 2.5),
        (-8.465, -6.35, 2.5),
        (0.365, -16.02, 2.5),
        (-20.455, -21.42, 2.5),
        (0.365, -26.82, 2.5),
        (21.185, -21.42, 2.5),
        (0.835, -6.35, 2.5),
        (6.585, -12.1, 2.5),
        (12.335, -6.35, 2.5),
        (6.585, -0.6, 2.5),
        (16.535, -6.35, 2.5),
        (-18.415, 8.22, 2.5),
        (-12.665, 13.97, 2.5),
        (-18.415, 19.72, 2.5),
        (-24.165, 13.97, 2.5),
        (-8.465, 13.97, 2.5),
        (6.585, 8.22, 2.5),
        (12.335, 13.97, 2.5),
        (6.585, 19.72, 2.5),
        (0.835, 13.97, 2.5),
        (16.535, 13.97, 2.5),
        (-33.615, 0, 16),
        (-32.115, 26.67, 5.3),
        (0, 29.17, 16),
        (-32.882767, 28.437767, 16),
        (32.882767, 28.437767, 16),
        (30.115, 26.67, 5.3),
        (26.035, -26.65, 5.3),
        (26.778949, -22.333949, 5.3),
        (31.095, -21.59, 5.3),
        (33.615, -22.86, 5.3),
        (32.138818, -27.693818, 5.3),
        (27.305, -29.17, 5.3),
        (27.575, -24.13, 5.3),
        (32.138818, -27.693818, 16),
        (-1.27, -29.17, 16),
        (-32.882767, -28.437767, 16),
        (33.615, 1.27, 16),
        (-26.035, -29.17, 3.9),
        (26.035, -29.17, 3.9),
        (-33.615, -21.59, 3.9),
        (33.615, -21.59, 3.9),
    ]]
    chamfer(f7_edges, length=F7_SIZE)


solid = f1.part
